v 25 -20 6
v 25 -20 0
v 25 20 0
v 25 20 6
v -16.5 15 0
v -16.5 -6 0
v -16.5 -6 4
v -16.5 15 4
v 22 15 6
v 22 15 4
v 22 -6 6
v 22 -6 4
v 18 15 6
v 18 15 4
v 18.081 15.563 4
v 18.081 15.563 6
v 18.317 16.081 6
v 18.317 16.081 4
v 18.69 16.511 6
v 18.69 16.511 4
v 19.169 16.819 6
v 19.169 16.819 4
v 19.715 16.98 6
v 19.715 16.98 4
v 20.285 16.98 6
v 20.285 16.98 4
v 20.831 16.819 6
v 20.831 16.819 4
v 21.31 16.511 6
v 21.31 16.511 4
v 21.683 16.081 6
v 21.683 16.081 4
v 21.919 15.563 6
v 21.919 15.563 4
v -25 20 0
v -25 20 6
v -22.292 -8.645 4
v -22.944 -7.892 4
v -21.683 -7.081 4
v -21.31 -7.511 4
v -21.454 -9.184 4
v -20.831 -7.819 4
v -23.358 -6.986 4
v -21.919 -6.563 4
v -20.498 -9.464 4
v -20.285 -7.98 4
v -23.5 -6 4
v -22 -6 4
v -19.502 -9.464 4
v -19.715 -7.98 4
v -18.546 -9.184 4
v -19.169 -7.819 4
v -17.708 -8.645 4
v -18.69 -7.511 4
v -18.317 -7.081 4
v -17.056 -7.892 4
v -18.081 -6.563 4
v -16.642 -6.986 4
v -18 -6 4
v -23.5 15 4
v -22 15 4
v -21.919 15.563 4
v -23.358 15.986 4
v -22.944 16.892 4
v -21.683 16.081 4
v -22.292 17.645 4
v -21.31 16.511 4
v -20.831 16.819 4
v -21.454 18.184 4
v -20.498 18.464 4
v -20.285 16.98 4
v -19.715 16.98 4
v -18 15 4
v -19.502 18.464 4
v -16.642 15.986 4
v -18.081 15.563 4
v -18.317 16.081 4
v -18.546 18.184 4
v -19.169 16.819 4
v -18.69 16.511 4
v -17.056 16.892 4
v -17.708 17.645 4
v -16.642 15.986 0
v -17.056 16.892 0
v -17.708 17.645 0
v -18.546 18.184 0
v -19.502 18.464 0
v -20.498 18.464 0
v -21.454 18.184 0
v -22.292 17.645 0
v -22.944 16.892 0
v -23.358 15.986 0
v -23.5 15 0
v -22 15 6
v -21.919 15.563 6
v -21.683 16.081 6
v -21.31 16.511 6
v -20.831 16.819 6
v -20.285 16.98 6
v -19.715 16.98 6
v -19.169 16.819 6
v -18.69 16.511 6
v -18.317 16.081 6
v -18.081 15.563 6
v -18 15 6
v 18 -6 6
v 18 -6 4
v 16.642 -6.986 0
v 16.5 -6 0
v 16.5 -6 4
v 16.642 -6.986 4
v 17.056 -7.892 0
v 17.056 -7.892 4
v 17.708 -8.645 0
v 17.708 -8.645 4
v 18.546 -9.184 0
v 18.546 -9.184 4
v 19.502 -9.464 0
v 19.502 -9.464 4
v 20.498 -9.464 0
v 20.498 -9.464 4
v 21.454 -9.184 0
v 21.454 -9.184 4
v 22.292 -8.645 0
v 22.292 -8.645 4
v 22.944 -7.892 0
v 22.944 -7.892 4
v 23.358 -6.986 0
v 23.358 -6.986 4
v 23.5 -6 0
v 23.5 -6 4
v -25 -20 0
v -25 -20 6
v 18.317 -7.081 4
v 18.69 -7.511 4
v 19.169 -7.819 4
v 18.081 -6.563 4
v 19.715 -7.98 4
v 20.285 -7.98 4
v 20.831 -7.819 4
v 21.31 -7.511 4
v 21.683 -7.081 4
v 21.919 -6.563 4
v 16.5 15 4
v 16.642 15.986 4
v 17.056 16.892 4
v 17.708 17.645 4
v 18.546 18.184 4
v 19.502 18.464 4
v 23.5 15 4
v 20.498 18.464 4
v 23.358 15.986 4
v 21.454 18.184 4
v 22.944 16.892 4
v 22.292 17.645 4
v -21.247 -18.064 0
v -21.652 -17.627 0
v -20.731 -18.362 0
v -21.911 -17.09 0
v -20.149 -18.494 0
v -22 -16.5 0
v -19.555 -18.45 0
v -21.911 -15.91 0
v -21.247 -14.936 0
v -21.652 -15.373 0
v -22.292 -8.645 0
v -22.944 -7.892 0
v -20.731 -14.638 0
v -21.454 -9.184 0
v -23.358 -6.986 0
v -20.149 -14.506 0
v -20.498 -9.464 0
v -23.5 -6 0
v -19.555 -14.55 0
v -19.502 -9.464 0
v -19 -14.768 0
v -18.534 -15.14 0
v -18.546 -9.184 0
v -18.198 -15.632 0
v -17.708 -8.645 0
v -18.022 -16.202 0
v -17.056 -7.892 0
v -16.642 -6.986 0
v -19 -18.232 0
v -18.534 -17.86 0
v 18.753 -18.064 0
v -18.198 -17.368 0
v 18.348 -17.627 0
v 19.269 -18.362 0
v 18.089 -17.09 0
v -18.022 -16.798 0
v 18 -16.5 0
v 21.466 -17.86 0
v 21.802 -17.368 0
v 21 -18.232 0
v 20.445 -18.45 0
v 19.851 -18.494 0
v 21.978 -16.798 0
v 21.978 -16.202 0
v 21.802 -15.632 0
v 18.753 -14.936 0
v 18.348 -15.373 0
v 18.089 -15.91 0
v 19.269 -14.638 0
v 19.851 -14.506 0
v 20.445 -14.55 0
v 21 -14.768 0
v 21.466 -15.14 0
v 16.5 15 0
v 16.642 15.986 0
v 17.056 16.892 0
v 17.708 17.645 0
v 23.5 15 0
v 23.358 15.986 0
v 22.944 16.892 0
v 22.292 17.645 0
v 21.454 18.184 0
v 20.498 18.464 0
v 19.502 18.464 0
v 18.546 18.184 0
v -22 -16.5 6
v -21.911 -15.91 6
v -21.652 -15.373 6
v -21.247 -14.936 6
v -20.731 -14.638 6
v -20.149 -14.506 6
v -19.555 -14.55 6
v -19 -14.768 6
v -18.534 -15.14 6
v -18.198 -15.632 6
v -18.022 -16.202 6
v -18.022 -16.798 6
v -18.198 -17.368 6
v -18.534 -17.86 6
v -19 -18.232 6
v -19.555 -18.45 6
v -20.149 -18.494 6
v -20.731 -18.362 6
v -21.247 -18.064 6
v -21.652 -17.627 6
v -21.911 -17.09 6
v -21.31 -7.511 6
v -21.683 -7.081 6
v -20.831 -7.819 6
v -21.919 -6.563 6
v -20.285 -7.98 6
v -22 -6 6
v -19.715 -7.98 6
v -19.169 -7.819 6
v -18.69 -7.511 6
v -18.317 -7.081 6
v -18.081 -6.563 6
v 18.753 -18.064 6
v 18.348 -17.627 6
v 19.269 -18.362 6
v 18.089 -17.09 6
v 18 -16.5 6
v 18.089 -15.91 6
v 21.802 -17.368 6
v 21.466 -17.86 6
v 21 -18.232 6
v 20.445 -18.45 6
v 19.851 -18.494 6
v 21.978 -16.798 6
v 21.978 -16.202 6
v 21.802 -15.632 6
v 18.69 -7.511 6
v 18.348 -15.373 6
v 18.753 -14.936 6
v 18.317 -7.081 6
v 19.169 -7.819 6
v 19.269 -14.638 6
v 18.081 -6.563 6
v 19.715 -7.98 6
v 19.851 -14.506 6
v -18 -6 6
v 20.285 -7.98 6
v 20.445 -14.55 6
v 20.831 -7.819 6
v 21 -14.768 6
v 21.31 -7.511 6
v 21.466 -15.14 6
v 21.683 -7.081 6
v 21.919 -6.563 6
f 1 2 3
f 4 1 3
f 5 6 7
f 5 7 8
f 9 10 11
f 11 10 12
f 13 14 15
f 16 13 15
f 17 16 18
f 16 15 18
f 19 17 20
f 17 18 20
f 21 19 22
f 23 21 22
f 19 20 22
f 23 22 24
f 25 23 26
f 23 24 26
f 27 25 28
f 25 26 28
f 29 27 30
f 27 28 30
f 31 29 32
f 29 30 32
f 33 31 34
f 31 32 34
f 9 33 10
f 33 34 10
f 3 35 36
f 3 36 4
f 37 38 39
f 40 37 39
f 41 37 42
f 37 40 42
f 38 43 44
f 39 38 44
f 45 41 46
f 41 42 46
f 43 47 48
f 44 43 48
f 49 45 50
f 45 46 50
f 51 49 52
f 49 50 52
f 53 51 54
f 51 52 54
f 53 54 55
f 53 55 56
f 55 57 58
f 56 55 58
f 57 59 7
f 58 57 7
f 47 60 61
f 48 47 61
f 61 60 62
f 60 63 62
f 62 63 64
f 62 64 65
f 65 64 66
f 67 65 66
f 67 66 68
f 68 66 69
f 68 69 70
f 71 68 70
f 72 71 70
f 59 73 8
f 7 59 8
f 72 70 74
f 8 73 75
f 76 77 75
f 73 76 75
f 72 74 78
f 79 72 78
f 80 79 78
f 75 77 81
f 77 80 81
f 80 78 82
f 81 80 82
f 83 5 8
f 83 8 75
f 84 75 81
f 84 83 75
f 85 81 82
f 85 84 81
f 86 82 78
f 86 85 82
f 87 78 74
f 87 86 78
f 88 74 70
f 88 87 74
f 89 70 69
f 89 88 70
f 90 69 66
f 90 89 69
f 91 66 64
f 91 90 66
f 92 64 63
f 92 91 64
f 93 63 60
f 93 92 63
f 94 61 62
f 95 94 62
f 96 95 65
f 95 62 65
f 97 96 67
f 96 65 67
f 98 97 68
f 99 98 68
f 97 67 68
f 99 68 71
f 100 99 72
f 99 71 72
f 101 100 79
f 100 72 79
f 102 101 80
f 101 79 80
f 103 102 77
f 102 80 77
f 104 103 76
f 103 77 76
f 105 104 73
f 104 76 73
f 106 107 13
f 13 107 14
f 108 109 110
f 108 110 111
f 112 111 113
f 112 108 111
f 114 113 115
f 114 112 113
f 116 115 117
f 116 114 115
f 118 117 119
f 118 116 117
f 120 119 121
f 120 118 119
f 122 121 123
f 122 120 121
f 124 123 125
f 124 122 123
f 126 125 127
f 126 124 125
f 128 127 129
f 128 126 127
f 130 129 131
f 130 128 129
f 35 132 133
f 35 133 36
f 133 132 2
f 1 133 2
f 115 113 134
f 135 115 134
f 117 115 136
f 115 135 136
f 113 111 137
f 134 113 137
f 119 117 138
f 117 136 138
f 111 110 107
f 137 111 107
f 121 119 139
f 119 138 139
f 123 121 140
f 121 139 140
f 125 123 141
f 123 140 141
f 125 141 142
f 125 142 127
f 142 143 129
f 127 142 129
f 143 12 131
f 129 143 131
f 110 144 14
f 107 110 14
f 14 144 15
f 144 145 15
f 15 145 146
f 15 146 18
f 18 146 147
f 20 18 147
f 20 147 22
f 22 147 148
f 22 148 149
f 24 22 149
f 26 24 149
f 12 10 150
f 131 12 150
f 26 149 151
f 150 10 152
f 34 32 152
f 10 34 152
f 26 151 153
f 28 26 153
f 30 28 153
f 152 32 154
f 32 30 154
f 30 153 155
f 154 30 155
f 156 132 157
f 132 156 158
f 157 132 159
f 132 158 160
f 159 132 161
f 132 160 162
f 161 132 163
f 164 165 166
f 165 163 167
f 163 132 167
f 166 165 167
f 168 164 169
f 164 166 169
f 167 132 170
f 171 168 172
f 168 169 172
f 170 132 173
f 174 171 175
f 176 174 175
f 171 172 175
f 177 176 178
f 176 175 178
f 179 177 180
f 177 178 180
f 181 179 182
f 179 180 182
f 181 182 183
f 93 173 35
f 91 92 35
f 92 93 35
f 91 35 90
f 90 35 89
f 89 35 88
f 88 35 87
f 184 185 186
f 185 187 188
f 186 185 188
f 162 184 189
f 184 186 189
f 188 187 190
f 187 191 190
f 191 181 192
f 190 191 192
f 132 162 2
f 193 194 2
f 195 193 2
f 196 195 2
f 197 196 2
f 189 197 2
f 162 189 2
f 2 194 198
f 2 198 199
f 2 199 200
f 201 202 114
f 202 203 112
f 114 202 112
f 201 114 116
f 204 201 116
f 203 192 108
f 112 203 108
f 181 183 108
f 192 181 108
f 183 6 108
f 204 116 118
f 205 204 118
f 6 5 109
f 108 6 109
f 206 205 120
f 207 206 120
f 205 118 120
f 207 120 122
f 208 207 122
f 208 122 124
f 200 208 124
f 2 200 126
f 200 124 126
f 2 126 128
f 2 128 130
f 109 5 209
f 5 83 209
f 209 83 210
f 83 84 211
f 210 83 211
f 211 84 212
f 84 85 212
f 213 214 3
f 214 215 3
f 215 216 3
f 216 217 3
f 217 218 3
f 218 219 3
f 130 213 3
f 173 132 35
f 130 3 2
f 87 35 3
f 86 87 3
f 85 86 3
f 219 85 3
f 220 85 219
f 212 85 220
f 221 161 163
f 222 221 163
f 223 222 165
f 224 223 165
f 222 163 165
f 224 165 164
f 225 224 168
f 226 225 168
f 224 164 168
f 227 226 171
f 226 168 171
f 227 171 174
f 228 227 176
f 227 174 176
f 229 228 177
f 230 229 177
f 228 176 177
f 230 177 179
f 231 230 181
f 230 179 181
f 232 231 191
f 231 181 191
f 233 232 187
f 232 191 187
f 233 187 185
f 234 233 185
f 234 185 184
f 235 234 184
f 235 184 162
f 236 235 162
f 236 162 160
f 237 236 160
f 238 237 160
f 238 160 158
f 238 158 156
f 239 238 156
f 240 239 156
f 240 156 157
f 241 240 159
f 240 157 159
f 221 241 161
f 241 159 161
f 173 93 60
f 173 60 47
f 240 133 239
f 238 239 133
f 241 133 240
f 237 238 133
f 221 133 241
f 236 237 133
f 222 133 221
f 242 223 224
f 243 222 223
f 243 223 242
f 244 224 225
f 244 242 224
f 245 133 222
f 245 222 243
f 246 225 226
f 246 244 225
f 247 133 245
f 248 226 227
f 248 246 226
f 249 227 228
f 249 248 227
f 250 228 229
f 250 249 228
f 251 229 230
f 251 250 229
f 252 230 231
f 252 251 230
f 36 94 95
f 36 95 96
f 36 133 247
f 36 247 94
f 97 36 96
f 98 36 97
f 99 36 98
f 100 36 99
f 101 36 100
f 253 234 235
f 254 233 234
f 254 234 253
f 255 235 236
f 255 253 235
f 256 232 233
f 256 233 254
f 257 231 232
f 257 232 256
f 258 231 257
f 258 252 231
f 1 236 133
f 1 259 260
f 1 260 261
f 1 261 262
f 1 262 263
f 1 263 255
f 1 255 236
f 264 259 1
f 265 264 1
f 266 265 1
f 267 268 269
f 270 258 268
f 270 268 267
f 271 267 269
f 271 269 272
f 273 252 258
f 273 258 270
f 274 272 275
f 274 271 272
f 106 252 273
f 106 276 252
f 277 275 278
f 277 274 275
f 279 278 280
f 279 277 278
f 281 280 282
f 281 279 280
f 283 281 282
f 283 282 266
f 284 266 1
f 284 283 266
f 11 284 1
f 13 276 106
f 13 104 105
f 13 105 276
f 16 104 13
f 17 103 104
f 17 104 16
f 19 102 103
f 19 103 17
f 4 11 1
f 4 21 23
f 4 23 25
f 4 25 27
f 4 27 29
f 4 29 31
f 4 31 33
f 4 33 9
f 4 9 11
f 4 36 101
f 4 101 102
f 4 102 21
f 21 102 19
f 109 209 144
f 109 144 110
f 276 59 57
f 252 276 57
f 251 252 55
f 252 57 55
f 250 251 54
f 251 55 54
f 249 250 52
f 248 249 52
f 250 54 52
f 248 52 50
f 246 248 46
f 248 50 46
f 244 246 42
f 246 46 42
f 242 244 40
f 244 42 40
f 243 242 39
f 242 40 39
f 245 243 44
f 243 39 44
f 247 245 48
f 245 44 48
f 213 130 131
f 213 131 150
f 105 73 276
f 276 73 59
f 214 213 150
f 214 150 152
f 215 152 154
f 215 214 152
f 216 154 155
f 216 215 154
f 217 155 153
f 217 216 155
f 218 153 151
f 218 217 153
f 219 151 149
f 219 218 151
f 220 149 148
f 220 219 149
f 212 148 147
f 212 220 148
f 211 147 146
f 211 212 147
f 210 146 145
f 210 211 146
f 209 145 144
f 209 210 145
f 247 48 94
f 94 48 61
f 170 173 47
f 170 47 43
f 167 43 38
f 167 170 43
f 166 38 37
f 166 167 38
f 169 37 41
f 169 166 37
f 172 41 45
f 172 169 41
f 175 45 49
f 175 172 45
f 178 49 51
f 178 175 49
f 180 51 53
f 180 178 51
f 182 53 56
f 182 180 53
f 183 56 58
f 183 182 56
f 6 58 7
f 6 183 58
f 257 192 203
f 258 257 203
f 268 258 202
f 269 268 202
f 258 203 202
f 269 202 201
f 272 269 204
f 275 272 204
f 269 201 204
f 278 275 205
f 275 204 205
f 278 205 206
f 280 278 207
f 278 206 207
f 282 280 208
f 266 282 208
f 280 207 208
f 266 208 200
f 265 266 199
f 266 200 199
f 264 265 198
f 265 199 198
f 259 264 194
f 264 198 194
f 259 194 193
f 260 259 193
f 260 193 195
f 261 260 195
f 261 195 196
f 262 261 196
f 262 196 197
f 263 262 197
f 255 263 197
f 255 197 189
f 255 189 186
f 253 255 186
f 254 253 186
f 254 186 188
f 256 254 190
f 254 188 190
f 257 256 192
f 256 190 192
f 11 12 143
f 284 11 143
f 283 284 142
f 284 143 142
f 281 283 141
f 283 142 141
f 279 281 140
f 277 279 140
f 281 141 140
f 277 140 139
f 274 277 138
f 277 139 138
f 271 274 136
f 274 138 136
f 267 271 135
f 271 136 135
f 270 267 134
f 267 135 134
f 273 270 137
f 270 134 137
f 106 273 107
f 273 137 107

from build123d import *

# Parameters (mm, degrees)
SKETCH1_W           = 50
SKETCH1_H           = 40
BOSS_EXTRUDE1_DEPTH = 6
CUT_EXTRUDE3_DEPTH  = 4
SKETCH7_R           = 2
CUT_EXTRUDE4_DEPTH  = 6


with BuildPart() as part:
    # Sketch1 → Boss-Extrude1 (new body)
    with BuildSketch(Plane.XY):
        Rectangle(SKETCH1_W, SKETCH1_H)
    extrude(amount=BOSS_EXTRUDE1_DEPTH)

    # Sketch6 → Cut-Extrude3 (cut)
    with BuildSketch(Plane(origin=(0, 0, 0), x_dir=(-1, 0, 0), z_dir=(0, 0, -1))):
        with BuildLine():
            Line((-16.5, 15), (-16.5, -6))
            ThreePointArc((-16.5, -6), (-20, -9.5), (-23.5, -6))
            Line((-23.5, -6), (-23.5, 15))
            ThreePointArc((-23.5, 15), (-20, 18.5), (-16.5, 15))
        make_face()
        with BuildLine():
            Line((23.5, 15), (23.5, -6))
            ThreePointArc((23.5, -6), (20, -9.5), (16.5, -6))
            Line((16.5, -6), (16.5, 15))
            ThreePointArc((16.5, 15), (20, 18.5), (23.5, 15))
        make_face()
    extrude(amount=-CUT_EXTRUDE3_DEPTH, mode=Mode.SUBTRACT)

    # Sketch7 → Cut-Extrude4 (cut)
    with BuildSketch(Plane(origin=(0, 0, 0), x_dir=(-1, 0, 0), z_dir=(0, 0, -1))):
        with Locations((-20, -16.5)):
            Circle(SKETCH7_R)
        with Locations((20, -16.5)):
            Circle(SKETCH7_R)
        with BuildLine():
            Line((-22, 15), (-22, -6))
            ThreePointArc((-22, -6), (-20, -8), (-18, -6))
            Line((-18, -6), (-18, 15))
            ThreePointArc((-18, 15), (-20, 17), (-22, 15))
        make_face()
        with BuildLine():
            Line((18, 15), (18, -6))
            ThreePointArc((18, -6), (20, -8), (22, -6))
            Line((22, -6), (22, 15))
            ThreePointArc((22, 15), (20, 17), (18, 15))
        make_face()
    extrude(amount=-CUT_EXTRUDE4_DEPTH, mode=Mode.SUBTRACT)


solid = part.part
